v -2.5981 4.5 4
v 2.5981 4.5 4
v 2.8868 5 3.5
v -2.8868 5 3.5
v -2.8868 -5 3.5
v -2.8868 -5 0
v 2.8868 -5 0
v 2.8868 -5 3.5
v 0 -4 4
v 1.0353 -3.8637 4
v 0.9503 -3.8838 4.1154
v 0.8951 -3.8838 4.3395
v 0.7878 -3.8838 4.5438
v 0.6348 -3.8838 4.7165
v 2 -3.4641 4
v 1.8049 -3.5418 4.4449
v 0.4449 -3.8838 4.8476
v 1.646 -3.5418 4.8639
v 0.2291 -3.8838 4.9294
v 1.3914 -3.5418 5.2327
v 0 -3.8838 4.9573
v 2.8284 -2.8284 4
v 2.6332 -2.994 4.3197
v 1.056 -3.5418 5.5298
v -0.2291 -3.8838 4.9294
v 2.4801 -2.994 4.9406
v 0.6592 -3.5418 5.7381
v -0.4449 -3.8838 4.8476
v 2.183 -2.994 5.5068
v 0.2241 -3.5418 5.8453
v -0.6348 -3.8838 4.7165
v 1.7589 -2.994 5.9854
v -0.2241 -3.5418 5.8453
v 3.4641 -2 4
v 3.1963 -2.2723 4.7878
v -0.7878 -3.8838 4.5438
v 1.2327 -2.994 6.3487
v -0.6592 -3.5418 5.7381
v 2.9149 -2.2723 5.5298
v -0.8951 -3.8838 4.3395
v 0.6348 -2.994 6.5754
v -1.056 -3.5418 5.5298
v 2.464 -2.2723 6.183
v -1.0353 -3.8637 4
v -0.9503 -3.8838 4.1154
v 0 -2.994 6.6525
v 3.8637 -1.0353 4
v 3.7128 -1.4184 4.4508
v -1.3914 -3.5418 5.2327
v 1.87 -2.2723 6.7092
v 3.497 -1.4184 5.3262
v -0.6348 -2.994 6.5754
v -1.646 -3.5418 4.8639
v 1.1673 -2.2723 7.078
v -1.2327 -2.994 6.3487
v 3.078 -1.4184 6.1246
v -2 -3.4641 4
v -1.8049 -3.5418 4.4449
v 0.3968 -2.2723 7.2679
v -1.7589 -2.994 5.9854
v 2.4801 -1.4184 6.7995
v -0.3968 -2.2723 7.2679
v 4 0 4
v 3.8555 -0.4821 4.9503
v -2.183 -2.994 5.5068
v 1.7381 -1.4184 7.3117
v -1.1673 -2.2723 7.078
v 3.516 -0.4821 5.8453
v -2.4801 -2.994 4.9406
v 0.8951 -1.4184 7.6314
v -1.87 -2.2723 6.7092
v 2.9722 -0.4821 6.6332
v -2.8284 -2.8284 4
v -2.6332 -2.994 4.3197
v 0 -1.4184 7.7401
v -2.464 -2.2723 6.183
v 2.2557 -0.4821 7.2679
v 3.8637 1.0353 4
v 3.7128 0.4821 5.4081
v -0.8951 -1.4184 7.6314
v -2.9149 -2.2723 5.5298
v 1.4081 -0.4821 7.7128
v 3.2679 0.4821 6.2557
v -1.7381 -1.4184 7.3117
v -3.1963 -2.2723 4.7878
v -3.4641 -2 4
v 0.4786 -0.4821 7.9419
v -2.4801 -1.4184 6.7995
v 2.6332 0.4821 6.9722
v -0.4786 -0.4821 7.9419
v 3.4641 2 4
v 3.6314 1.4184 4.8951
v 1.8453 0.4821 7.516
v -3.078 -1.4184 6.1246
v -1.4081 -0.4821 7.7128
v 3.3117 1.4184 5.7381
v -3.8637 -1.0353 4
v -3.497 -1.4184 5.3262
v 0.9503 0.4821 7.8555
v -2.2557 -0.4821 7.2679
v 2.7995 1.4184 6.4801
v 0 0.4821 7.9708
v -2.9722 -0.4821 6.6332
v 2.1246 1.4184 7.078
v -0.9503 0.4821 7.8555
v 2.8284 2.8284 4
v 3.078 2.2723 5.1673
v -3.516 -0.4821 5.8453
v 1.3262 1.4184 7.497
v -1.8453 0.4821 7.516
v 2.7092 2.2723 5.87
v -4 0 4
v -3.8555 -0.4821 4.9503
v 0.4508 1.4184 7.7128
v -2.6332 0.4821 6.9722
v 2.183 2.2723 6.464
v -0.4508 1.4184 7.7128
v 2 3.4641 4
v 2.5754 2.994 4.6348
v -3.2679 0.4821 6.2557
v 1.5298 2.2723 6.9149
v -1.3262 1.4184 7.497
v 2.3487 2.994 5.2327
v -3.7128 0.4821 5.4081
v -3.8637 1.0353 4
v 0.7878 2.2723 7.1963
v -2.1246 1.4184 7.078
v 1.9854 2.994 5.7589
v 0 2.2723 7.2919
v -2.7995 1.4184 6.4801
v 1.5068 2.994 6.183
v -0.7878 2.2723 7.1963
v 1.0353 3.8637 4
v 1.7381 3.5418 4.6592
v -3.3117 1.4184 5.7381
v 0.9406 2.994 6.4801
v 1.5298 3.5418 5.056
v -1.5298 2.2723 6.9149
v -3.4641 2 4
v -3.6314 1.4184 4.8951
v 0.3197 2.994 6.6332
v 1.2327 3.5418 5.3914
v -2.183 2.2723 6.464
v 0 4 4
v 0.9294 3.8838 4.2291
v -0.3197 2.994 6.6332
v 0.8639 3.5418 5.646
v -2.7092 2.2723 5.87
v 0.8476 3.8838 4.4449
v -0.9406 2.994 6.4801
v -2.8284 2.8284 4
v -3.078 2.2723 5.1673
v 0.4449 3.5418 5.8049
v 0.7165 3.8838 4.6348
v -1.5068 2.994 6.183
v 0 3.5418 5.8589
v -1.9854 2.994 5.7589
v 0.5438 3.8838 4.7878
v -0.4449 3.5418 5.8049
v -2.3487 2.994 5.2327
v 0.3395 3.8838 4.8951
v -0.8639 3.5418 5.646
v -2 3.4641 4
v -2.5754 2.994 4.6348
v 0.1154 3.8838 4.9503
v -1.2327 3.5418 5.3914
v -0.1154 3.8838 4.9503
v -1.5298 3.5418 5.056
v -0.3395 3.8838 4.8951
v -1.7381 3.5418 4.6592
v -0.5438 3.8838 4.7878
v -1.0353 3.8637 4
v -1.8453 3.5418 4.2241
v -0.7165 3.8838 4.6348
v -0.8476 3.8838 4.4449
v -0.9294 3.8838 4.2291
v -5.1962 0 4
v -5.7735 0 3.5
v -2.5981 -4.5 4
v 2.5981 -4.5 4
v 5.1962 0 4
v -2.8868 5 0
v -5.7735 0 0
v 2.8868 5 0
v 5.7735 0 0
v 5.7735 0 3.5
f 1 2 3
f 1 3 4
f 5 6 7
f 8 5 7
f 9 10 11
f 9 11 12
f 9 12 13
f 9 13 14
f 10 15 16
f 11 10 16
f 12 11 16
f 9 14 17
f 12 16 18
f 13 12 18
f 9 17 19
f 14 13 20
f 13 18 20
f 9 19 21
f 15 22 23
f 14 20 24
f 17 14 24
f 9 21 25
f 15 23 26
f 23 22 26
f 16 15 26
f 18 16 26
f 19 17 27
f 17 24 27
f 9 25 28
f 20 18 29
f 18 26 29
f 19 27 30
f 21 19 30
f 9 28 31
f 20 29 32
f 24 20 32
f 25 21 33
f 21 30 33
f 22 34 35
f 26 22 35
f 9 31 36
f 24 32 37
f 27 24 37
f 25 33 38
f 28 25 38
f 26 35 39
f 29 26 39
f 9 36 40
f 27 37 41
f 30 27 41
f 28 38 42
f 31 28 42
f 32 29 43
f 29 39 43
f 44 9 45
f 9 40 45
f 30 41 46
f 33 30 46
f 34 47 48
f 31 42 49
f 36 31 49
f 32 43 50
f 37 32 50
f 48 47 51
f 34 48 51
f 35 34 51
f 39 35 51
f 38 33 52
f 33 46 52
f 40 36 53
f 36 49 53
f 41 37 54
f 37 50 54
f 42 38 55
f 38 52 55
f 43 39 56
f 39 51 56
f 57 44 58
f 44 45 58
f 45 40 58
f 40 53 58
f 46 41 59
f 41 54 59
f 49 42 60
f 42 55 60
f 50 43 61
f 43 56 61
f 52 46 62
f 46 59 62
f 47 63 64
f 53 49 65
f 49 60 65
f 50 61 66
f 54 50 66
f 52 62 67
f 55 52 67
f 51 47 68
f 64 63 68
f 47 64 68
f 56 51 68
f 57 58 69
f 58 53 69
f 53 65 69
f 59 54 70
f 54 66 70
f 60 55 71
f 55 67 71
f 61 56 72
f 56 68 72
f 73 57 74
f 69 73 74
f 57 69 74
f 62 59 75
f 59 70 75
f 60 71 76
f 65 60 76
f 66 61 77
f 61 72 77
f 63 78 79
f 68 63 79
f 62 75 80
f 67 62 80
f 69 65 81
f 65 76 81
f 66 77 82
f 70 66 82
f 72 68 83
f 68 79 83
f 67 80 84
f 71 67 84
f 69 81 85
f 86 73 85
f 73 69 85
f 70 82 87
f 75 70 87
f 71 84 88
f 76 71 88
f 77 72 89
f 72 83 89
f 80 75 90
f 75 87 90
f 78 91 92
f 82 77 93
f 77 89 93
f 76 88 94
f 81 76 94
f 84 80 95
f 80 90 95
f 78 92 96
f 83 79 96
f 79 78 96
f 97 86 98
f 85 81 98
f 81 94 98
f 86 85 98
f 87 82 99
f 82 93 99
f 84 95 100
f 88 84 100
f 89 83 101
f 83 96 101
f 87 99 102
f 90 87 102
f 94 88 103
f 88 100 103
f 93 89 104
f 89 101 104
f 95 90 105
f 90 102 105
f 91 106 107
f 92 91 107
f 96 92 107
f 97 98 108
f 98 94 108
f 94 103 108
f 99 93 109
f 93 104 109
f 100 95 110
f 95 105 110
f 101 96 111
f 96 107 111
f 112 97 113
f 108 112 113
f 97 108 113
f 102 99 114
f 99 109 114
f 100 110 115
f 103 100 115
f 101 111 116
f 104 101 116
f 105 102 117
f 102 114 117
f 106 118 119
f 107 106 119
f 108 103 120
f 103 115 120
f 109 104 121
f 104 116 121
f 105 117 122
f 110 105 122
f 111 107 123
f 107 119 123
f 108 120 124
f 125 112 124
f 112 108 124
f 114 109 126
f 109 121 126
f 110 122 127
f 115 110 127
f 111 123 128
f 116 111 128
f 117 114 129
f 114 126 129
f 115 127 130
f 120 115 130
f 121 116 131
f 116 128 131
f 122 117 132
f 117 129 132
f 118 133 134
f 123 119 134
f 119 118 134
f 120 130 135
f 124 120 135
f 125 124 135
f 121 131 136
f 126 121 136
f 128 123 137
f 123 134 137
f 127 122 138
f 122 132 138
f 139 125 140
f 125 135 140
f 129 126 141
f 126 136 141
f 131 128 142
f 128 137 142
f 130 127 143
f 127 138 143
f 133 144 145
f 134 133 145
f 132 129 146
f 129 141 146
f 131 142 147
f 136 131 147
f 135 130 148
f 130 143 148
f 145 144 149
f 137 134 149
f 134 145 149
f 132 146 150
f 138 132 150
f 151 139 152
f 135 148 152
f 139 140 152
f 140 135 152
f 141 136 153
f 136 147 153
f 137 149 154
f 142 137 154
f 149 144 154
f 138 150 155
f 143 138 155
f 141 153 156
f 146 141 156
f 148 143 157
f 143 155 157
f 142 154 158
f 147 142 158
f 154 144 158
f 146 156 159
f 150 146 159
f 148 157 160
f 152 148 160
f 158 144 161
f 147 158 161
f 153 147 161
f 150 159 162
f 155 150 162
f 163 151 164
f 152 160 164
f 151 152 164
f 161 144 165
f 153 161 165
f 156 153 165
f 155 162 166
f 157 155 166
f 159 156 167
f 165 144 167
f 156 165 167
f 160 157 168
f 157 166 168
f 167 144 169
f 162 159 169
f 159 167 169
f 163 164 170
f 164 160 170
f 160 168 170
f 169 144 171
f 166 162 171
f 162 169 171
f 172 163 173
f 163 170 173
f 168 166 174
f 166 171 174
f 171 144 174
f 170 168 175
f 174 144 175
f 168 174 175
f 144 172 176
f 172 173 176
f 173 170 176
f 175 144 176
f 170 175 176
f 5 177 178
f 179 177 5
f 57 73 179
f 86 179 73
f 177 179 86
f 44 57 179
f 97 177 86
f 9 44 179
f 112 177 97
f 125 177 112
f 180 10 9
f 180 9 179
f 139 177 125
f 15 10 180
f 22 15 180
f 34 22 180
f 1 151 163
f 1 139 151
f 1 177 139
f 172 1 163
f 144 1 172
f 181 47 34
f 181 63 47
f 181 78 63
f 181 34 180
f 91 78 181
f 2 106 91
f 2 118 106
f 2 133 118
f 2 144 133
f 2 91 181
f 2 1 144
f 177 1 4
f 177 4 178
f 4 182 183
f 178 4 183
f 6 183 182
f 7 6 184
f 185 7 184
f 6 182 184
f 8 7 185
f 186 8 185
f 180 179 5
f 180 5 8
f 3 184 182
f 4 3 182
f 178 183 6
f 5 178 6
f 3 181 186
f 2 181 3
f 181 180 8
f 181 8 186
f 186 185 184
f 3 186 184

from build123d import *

# Parameters (mm, degrees)
F1_DEPTH = 4
F2_SIZE  = 0.5


with BuildPart() as f1:
    # F0 (on Top) → F1 (new body)
    with BuildSketch(Plane.XY):
        Polygon((2.886751, 5), (-2.886751, 5), (-5.773503, 0), (-2.886751, -5), (2.886751, -5), (5.773503, 0), align=None)
    extrude(amount=F1_DEPTH)

    # F2
    f2_edges = [f1.edges().sort_by_distance(p)[0] for p in [
        (4.330127, -2.5, 4),
        (0, -5, 4),
        (-4.330127, -2.5, 4),
        (-4.330127, 2.5, 4),
        (0, 5, 4),
        (4.330127, 2.5, 4),
    ]]
    chamfer(f2_edges, length=F2_SIZE)

    # F3 (on face) → F4 (revolve)
    with BuildSketch(Plane.XY.offset(4)):
        with BuildLine():
            Line((0, 4), (0, -4))
            ThreePointArc((0, -4), (4, 0), (0, 4))
        make_face()
    revolve(axis=Axis((0, 0, 4), (0, -1, 0)))


solid = f1.part
